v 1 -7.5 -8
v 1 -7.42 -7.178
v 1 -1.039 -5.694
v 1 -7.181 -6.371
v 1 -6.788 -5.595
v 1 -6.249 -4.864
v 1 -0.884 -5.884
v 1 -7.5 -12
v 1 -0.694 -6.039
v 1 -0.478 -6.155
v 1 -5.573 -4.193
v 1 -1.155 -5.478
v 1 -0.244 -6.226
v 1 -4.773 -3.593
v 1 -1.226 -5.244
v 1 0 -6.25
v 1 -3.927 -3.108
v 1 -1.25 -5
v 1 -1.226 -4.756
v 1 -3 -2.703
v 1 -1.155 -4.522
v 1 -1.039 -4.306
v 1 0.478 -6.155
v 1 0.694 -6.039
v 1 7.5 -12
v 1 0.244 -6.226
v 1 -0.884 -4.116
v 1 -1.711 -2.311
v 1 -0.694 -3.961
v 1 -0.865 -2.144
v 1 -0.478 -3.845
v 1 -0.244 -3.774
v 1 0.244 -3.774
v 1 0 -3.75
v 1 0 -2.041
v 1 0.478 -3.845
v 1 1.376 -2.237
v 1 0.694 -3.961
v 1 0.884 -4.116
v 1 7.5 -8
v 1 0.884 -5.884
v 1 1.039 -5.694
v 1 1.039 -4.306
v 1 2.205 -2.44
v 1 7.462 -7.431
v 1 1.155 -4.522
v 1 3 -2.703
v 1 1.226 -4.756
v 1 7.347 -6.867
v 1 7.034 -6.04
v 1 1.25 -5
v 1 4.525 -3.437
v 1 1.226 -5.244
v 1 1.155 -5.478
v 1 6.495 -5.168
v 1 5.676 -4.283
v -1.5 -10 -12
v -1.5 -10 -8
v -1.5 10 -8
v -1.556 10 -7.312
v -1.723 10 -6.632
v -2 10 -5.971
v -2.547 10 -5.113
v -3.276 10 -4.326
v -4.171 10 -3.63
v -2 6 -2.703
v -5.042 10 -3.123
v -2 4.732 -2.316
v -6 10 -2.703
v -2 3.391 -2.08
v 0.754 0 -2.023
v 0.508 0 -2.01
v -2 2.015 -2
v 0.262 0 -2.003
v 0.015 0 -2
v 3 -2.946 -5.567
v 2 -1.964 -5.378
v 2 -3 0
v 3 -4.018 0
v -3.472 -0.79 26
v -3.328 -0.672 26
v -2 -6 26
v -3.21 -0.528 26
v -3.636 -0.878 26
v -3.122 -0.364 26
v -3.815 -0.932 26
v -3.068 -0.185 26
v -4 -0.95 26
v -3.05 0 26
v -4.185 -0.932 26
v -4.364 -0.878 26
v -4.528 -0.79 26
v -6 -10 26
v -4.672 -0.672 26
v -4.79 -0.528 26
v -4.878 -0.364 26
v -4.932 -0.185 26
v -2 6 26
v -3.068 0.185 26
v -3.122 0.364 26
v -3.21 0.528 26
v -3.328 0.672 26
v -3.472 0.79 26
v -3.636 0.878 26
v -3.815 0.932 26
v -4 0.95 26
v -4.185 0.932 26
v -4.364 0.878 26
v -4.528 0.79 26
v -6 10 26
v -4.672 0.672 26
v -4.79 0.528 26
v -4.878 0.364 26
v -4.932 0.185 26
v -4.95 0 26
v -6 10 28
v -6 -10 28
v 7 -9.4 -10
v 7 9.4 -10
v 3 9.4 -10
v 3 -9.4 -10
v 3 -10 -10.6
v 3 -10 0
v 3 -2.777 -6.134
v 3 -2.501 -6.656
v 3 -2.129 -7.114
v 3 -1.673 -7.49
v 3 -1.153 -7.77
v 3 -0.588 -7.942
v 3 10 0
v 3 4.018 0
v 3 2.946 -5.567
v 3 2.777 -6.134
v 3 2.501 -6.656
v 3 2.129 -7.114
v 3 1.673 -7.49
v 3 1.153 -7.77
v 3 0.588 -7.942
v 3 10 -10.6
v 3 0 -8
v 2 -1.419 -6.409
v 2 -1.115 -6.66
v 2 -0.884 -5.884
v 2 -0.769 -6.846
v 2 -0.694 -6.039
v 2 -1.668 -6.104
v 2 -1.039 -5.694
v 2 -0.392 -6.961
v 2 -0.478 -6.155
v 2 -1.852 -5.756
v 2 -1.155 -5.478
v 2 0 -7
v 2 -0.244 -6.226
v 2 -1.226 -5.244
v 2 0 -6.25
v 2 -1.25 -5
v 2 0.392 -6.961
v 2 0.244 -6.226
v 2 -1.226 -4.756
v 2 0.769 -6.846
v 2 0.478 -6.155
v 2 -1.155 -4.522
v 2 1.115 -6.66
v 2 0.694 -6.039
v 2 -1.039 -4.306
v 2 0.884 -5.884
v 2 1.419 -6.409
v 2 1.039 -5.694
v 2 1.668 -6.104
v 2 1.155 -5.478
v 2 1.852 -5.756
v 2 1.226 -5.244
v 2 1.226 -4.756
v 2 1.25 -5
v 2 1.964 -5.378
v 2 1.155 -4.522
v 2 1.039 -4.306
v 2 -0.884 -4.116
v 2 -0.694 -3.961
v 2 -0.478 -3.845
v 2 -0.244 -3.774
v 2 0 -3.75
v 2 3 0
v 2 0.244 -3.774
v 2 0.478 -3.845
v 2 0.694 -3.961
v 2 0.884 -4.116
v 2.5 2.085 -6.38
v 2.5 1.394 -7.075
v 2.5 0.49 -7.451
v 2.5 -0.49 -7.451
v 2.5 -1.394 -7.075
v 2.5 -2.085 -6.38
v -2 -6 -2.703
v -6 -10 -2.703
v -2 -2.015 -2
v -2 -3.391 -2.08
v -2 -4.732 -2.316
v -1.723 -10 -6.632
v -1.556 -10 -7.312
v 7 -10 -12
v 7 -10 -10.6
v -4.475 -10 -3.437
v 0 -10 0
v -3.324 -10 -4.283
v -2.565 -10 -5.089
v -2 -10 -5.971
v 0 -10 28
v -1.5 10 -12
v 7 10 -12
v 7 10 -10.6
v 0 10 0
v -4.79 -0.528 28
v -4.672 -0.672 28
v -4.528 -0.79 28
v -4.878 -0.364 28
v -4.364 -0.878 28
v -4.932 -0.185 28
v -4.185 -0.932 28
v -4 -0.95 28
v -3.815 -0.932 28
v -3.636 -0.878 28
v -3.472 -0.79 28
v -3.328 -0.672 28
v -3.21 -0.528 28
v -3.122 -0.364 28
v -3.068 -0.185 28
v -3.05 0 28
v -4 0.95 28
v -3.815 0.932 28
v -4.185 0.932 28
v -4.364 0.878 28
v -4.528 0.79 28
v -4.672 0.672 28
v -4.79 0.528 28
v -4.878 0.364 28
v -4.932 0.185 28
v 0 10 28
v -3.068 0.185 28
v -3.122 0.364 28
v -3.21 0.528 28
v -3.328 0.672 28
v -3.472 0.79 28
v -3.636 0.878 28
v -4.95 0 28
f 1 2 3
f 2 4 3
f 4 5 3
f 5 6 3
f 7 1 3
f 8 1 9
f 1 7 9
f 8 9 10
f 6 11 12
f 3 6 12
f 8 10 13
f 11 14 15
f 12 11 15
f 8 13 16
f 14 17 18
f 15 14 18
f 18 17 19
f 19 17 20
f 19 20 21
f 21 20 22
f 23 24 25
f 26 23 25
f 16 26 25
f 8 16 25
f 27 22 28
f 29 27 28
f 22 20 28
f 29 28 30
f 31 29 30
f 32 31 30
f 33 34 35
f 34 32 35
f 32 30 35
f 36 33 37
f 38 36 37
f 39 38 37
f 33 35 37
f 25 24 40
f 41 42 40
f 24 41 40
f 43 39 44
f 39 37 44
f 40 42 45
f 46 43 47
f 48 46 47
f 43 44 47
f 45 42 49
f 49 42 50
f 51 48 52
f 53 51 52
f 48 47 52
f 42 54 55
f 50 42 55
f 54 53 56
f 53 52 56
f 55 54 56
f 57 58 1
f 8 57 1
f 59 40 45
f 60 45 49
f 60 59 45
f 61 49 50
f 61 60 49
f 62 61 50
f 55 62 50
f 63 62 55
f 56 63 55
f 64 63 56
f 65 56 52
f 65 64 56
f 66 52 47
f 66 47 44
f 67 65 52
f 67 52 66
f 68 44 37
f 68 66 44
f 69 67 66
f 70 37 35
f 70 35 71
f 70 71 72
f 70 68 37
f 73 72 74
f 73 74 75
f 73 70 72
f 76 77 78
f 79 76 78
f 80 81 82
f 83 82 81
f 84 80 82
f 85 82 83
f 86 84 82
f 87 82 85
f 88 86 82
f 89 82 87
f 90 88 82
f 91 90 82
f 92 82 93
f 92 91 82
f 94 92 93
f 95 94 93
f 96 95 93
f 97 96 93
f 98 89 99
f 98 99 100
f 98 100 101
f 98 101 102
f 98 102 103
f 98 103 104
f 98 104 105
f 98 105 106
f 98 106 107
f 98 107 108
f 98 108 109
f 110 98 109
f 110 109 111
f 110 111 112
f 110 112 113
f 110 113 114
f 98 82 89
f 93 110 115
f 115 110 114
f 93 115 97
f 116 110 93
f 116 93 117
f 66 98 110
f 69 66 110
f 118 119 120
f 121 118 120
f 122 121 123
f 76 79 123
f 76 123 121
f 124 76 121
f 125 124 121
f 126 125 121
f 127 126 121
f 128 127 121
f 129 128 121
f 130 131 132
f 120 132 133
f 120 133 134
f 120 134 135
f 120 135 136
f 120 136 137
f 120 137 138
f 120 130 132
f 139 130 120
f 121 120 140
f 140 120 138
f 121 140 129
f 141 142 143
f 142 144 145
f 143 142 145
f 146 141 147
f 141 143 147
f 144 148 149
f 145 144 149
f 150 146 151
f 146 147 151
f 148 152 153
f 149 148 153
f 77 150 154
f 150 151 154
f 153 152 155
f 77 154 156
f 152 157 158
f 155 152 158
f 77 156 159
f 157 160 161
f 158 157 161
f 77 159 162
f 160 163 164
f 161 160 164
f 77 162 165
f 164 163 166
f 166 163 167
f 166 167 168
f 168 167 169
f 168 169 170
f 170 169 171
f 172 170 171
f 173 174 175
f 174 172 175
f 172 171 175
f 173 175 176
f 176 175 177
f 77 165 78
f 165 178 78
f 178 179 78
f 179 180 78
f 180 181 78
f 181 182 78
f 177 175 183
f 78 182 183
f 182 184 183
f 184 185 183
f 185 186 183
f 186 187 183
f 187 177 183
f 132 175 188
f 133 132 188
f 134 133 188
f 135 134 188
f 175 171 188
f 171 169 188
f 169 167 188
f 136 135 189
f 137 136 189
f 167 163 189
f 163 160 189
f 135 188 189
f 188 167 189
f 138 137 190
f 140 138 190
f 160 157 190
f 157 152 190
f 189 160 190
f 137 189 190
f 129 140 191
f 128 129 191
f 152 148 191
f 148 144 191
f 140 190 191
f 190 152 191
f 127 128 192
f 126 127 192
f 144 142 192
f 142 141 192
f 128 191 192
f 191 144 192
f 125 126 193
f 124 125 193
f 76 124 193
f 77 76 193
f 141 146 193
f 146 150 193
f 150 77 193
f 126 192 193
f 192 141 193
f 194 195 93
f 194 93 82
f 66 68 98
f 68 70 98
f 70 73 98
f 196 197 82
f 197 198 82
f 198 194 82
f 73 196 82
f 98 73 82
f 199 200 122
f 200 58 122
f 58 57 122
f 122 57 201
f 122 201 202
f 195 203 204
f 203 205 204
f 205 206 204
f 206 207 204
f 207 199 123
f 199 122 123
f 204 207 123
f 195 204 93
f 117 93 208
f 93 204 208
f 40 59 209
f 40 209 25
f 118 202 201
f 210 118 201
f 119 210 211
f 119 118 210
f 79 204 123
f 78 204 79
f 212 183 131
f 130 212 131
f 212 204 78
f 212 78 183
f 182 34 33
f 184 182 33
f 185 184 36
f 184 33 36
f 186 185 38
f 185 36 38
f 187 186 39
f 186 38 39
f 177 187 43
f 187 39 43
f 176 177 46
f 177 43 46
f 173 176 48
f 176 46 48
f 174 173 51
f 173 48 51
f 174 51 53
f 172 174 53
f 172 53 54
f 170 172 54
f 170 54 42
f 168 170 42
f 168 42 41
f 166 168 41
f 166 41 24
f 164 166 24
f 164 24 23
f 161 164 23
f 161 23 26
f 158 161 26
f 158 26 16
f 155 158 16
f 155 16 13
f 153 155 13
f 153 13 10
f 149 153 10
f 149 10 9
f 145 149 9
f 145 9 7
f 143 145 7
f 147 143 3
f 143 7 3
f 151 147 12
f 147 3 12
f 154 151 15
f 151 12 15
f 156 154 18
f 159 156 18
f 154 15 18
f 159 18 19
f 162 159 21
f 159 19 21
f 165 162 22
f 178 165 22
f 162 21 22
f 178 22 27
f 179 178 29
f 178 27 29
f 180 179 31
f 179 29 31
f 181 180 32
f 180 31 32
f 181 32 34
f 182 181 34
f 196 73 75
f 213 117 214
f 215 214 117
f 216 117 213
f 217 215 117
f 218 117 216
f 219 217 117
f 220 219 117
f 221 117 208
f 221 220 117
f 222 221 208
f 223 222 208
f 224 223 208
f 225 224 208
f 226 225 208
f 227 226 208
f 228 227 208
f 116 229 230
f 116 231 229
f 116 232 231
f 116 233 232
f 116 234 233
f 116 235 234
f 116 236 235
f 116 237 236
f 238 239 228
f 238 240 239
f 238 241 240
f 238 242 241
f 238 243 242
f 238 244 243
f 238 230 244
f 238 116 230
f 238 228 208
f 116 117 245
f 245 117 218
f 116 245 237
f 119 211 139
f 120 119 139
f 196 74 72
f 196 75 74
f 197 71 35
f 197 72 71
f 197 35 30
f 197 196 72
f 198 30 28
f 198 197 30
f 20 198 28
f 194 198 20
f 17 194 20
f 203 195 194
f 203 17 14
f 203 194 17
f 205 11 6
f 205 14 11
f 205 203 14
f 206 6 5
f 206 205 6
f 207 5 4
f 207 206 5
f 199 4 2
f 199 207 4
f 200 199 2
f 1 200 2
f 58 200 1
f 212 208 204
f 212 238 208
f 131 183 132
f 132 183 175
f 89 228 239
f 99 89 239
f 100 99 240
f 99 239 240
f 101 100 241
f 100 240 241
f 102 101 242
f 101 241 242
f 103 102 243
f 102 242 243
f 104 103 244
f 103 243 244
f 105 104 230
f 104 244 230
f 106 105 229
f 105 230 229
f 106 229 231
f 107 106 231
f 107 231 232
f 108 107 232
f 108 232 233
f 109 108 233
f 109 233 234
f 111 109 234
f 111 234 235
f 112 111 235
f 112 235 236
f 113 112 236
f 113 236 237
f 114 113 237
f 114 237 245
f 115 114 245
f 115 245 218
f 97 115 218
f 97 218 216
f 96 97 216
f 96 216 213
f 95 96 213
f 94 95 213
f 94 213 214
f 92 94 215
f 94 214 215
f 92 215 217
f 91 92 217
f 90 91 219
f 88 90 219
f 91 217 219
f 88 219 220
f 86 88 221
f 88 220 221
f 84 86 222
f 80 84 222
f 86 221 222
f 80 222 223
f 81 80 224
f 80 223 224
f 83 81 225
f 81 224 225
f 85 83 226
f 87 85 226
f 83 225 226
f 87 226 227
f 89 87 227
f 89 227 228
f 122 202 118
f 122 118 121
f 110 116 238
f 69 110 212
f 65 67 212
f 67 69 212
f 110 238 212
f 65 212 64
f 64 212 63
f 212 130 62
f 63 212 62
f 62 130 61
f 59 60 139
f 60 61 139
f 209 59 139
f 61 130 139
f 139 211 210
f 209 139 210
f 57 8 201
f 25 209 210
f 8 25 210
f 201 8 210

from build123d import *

# Parameters (mm, degrees)
EXTRUDE_1_DEPTH     = 10
SKETCH_2_R          = 1.25
CUT_EXTRUDE_1_DEPTH = 15
SKETCH_4_R          = 0.95
CUT_EXTRUDE_2_DEPTH = 40.749213829
EXTRUDE_2_DEPTH     = 28
SKETCH_7_W          = 6
SKETCH_7_H          = 20
EXTRUDE_4_DEPTH     = 2
CHAMFER_1_SIZE      = 0.6
EXTRUDE_5_DEPTH     = 10
FILLET_2_R          = 6
CUT_EXTRUDE_3_DEPTH = 1
CHAMFER_2_SIZE      = 1


# Some blends are built 0.0001 mm under size
with BuildPart() as part:
    # 草图1 → 凸台-拉伸1 (new, symmetric)
    with BuildSketch(Plane(origin=(0, 0, 0), x_dir=(1, 0, 0), z_dir=(0, 1, 0))):
        Polygon((0, 0), (3, 0), (3, 10), (1, 10), (1, 2), (-2, 2), (-2, -26), (-6, -26), (-6, -28), (0, -28), align=None)
    extrude(amount=EXTRUDE_1_DEPTH, both=True)

    # 草图2 → 切除-拉伸1 (cut)
    with BuildSketch(Plane.ZY.offset(-1)):
        with Locations((-5, 0)):
            Circle(SKETCH_2_R)
    extrude(amount=-CUT_EXTRUDE_1_DEPTH, mode=Mode.SUBTRACT)

    # 草图4 → 切除-拉伸2 (cut, through all)
    with BuildSketch(Plane.XY.offset(28)):
        with Locations((-4, 0)):
            Circle(SKETCH_4_R)
    extrude(amount=-CUT_EXTRUDE_2_DEPTH, mode=Mode.SUBTRACT)

    # 草图5 → 凸台-拉伸2 (add)
    with BuildSketch(Plane(origin=(0, 0, 26), x_dir=(-1, 0, 0), z_dir=(0, 0, -1))):
        Polygon((2, 10), (6, 10), (2, 6), align=None)
        Polygon((2, -6), (2, -10), (6, -10), align=None)
    extrude(amount=EXTRUDE_2_DEPTH)

    # 草图7 → 凸台-拉伸4 (add)
    with BuildSketch(Plane(origin=(0, 0, -10), x_dir=(-1, 0, 0), z_dir=(0, 0, -1))):
        with Locations((-4, 0)):
            Rectangle(SKETCH_7_W, SKETCH_7_H)
    extrude(amount=EXTRUDE_4_DEPTH)

    # 倒角1
    chamfer_1_edges = [part.edges().sort_by_distance(p)[0] for p in [
        (5, 10, -10),
        (5, -10, -10),
    ]]
    chamfer(chamfer_1_edges, length=CHAMFER_1_SIZE)

    # 草图8 → 凸台-拉伸5 (add)
    with BuildSketch(Plane(origin=(0, 0, -2), x_dir=(-1, 0, 0), z_dir=(0, 0, -1))):
        Polygon((-1, 10), (1.5, 10), (-1, 7.5), align=None)
        Polygon((-1, -7.5), (-1, -10), (1.5, -10), align=None)
    extrude(amount=EXTRUDE_5_DEPTH)

    # 圆角2
    # the kernel refuses this fillet: 6 mm, written as the material it adds along each edge
    with BuildSketch(Plane(origin=(-12.106601718, -20.606601718, -2), x_dir=(-0.7071067811865437, 0.7071067811865513, 0), z_dir=(0.7071067811865513, 0.7071067811865438, 0))) as fillet_2_piece_1_section:
        with BuildLine():
            CenterArc((FILLET_2_R, -FILLET_2_R), FILLET_2_R, 90, 90)
            Line((0, -FILLET_2_R), (0, 0))
            Line((0, 0), (FILLET_2_R, 0))
        make_face()
    fillet_2_piece_1 = extrude(amount=33.535533906, mode=Mode.PRIVATE)
    fillet_2_piece_1 = split(fillet_2_piece_1, bisect_by=Plane(origin=(-2, -8.855149606, -2.774001208), z_dir=(-1, 0, 0)), keep=Keep.TOP, mode=Mode.PRIVATE)
    fillet_2_piece_1 = split(fillet_2_piece_1, bisect_by=Plane(origin=(-4, -8, -2.774001208), z_dir=(0.7071067811865515, -0.7071067811865436, 0)), keep=Keep.TOP, mode=Mode.PRIVATE)
    fillet_2_piece_1 = split(fillet_2_piece_1, bisect_by=Plane(origin=(-3.144850394, -10, -2.774001208), z_dir=(0, 1, 0)), keep=Keep.TOP, mode=Mode.PRIVATE)
    add(fillet_2_piece_1)
    with BuildSketch(Plane(origin=(-12.106601718, -20.606601718, -2), x_dir=(-0.7071067811865437, 0.7071067811865513, 0), z_dir=(0.7071067811865513, 0.7071067811865438, 0))) as fillet_2_piece_2_section:
        with BuildLine():
            CenterArc((FILLET_2_R, -FILLET_2_R), FILLET_2_R, 90, 90)
            Line((0, -FILLET_2_R), (0, 0))
            Line((0, 0), (FILLET_2_R, 0))
        make_face()
    fillet_2_piece_2 = extrude(amount=33.535533906, mode=Mode.PRIVATE)
    fillet_2_piece_2 = split(fillet_2_piece_2, bisect_by=Plane(origin=(1, -3.168547951, -2.116110368), z_dir=(-1, 0, 0)), keep=Keep.TOP, mode=Mode.PRIVATE)
    fillet_2_piece_2 = split(fillet_2_piece_2, bisect_by=Plane(origin=(-2, -3.168547951, -2.116110368), z_dir=(1, 0, 0)), keep=Keep.TOP, mode=Mode.PRIVATE)
    fillet_2_piece_2 = split(fillet_2_piece_2, bisect_by=Plane(origin=(0.165726024, -3.834273976, -2.116110368), z_dir=(-0.7071067811865515, 0.7071067811865436, 0)), keep=Keep.TOP, mode=Mode.PRIVATE)
    add(fillet_2_piece_2)
    with BuildSketch(Plane(origin=(-12.106601718, -20.606601718, -2), x_dir=(-0.7071067811865437, 0.7071067811865513, 0), z_dir=(0.7071067811865513, 0.7071067811865438, 0))) as fillet_2_piece_3_section:
        with BuildLine():
            CenterArc((FILLET_2_R, -FILLET_2_R), FILLET_2_R, 90, 90)
            Line((0, -FILLET_2_R), (0, 0))
            Line((0, 0), (FILLET_2_R, 0))
        make_face()
    fillet_2_piece_3 = extrude(amount=33.535533906, mode=Mode.PRIVATE)
    fillet_2_piece_3 = split(fillet_2_piece_3, bisect_by=Plane(origin=(1, -7.448559775, -3.464262476), z_dir=(-1, 0, 0)), keep=Keep.TOP, mode=Mode.PRIVATE)
    fillet_2_piece_3 = split(fillet_2_piece_3, bisect_by=Plane(origin=(-2, -7.448559775, -3.464262476), z_dir=(1, 0, 0)), keep=Keep.TOP, mode=Mode.PRIVATE)
    fillet_2_piece_3 = split(fillet_2_piece_3, bisect_by=Plane(origin=(-1.950921276, -5.950921276, -3.464262476), z_dir=(0.7071067811865515, -0.7071067811865436, 0)), keep=Keep.TOP, mode=Mode.PRIVATE)
    fillet_2_piece_3 = split(fillet_2_piece_3, bisect_by=Plane(origin=(-0.453282777, -10, -3.464262476), z_dir=(0, 1, 0)), keep=Keep.TOP, mode=Mode.PRIVATE)
    add(fillet_2_piece_3)
    with BuildSketch(Plane(origin=(-12.106601718, 20.606601718, -2), x_dir=(-0.707106781186544, -0.7071067811865511, 0), z_dir=(0.7071067811865511, -0.7071067811865439, 0))) as fillet_2_piece_4_section:
        with BuildLine():
            CenterArc((FILLET_2_R, FILLET_2_R), FILLET_2_R, 180, 90)
            Line((0, FILLET_2_R), (0, 0))
            Line((0, 0), (FILLET_2_R, 0))
        make_face()
    fillet_2_piece_4 = extrude(amount=33.535533906, mode=Mode.PRIVATE)
    fillet_2_piece_4 = split(fillet_2_piece_4, bisect_by=Plane(origin=(-3.144850394, 10, -2.774001208), z_dir=(0, -1, 0)), keep=Keep.TOP, mode=Mode.PRIVATE)
    fillet_2_piece_4 = split(fillet_2_piece_4, bisect_by=Plane(origin=(-4, 8, -2.774001208), z_dir=(0.7071067811865515, 0.7071067811865436, 0)), keep=Keep.TOP, mode=Mode.PRIVATE)
    fillet_2_piece_4 = split(fillet_2_piece_4, bisect_by=Plane(origin=(-2, 8.855149606, -2.774001208), z_dir=(-1, 0, 0)), keep=Keep.TOP, mode=Mode.PRIVATE)
    add(fillet_2_piece_4)
    with BuildSketch(Plane(origin=(-12.106601718, 20.606601718, -2), x_dir=(-0.707106781186544, -0.7071067811865511, 0), z_dir=(0.7071067811865511, -0.7071067811865439, 0))) as fillet_2_piece_5_section:
        with BuildLine():
            CenterArc((FILLET_2_R, FILLET_2_R), FILLET_2_R, 180, 90)
            Line((0, FILLET_2_R), (0, 0))
            Line((0, 0), (FILLET_2_R, 0))
        make_face()
    fillet_2_piece_5 = extrude(amount=33.535533906, mode=Mode.PRIVATE)
    fillet_2_piece_5 = split(fillet_2_piece_5, bisect_by=Plane(origin=(1, 3.168547951, -2.116110368), z_dir=(-1, 0, 0)), keep=Keep.TOP, mode=Mode.PRIVATE)
    fillet_2_piece_5 = split(fillet_2_piece_5, bisect_by=Plane(origin=(0.165726024, 3.834273976, -2.116110368), z_dir=(-0.7071067811865515, -0.7071067811865436, 0)), keep=Keep.TOP, mode=Mode.PRIVATE)
    fillet_2_piece_5 = split(fillet_2_piece_5, bisect_by=Plane(origin=(-2, 3.168547951, -2.116110368), z_dir=(1, 0, 0)), keep=Keep.TOP, mode=Mode.PRIVATE)
    add(fillet_2_piece_5)
    with BuildSketch(Plane(origin=(-12.106601718, 20.606601718, -2), x_dir=(-0.707106781186544, -0.7071067811865511, 0), z_dir=(0.7071067811865511, -0.7071067811865439, 0))) as fillet_2_piece_6_section:
        with BuildLine():
            CenterArc((FILLET_2_R, FILLET_2_R), FILLET_2_R, 180, 90)
            Line((0, FILLET_2_R), (0, 0))
            Line((0, 0), (FILLET_2_R, 0))
        make_face()
    fillet_2_piece_6 = extrude(amount=33.535533906, mode=Mode.PRIVATE)
    fillet_2_piece_6 = split(fillet_2_piece_6, bisect_by=Plane(origin=(1, 7.448559775, -3.464262476), z_dir=(-1, 0, 0)), keep=Keep.TOP, mode=Mode.PRIVATE)
    fillet_2_piece_6 = split(fillet_2_piece_6, bisect_by=Plane(origin=(-0.453282777, 10, -3.464262476), z_dir=(0, -1, 0)), keep=Keep.TOP, mode=Mode.PRIVATE)
    fillet_2_piece_6 = split(fillet_2_piece_6, bisect_by=Plane(origin=(-1.950921276, 5.950921276, -3.464262476), z_dir=(0.7071067811865515, 0.7071067811865436, 0)), keep=Keep.TOP, mode=Mode.PRIVATE)
    fillet_2_piece_6 = split(fillet_2_piece_6, bisect_by=Plane(origin=(-2, 7.448559775, -3.464262476), z_dir=(1, 0, 0)), keep=Keep.TOP, mode=Mode.PRIVATE)
    add(fillet_2_piece_6)

    # 草图9 → 切除-拉伸3 (cut)
    with BuildSketch(Plane(origin=(3, 0, 0), x_dir=(0, 0, -1), z_dir=(1, 0, 0))):
        with BuildLine():
            Line((0, -3), (0, 3))
            Line((0, 3), (5.378333925, 1.963889875))
            ThreePointArc((5.378333925, 1.963889875), (7, 0), (5.378333925, -1.963889875))
            Line((5.378333925, -1.963889875), (0, -3))
        make_face()
    extrude(amount=-CUT_EXTRUDE_3_DEPTH, mode=Mode.SUBTRACT)

    # 倒角2
    chamfer_2_edges = [part.edges().sort_by_distance(p)[0] for p in [
        (3, -2.481944938, -2.689166963),
        (3, 0, -7),
        (3, 2.481944938, -2.689166963),
    ]]
    chamfer(chamfer_2_edges, length=CHAMFER_2_SIZE - 0.0001)  # a hair under: the kernel refuses the full size


solid = part.part
